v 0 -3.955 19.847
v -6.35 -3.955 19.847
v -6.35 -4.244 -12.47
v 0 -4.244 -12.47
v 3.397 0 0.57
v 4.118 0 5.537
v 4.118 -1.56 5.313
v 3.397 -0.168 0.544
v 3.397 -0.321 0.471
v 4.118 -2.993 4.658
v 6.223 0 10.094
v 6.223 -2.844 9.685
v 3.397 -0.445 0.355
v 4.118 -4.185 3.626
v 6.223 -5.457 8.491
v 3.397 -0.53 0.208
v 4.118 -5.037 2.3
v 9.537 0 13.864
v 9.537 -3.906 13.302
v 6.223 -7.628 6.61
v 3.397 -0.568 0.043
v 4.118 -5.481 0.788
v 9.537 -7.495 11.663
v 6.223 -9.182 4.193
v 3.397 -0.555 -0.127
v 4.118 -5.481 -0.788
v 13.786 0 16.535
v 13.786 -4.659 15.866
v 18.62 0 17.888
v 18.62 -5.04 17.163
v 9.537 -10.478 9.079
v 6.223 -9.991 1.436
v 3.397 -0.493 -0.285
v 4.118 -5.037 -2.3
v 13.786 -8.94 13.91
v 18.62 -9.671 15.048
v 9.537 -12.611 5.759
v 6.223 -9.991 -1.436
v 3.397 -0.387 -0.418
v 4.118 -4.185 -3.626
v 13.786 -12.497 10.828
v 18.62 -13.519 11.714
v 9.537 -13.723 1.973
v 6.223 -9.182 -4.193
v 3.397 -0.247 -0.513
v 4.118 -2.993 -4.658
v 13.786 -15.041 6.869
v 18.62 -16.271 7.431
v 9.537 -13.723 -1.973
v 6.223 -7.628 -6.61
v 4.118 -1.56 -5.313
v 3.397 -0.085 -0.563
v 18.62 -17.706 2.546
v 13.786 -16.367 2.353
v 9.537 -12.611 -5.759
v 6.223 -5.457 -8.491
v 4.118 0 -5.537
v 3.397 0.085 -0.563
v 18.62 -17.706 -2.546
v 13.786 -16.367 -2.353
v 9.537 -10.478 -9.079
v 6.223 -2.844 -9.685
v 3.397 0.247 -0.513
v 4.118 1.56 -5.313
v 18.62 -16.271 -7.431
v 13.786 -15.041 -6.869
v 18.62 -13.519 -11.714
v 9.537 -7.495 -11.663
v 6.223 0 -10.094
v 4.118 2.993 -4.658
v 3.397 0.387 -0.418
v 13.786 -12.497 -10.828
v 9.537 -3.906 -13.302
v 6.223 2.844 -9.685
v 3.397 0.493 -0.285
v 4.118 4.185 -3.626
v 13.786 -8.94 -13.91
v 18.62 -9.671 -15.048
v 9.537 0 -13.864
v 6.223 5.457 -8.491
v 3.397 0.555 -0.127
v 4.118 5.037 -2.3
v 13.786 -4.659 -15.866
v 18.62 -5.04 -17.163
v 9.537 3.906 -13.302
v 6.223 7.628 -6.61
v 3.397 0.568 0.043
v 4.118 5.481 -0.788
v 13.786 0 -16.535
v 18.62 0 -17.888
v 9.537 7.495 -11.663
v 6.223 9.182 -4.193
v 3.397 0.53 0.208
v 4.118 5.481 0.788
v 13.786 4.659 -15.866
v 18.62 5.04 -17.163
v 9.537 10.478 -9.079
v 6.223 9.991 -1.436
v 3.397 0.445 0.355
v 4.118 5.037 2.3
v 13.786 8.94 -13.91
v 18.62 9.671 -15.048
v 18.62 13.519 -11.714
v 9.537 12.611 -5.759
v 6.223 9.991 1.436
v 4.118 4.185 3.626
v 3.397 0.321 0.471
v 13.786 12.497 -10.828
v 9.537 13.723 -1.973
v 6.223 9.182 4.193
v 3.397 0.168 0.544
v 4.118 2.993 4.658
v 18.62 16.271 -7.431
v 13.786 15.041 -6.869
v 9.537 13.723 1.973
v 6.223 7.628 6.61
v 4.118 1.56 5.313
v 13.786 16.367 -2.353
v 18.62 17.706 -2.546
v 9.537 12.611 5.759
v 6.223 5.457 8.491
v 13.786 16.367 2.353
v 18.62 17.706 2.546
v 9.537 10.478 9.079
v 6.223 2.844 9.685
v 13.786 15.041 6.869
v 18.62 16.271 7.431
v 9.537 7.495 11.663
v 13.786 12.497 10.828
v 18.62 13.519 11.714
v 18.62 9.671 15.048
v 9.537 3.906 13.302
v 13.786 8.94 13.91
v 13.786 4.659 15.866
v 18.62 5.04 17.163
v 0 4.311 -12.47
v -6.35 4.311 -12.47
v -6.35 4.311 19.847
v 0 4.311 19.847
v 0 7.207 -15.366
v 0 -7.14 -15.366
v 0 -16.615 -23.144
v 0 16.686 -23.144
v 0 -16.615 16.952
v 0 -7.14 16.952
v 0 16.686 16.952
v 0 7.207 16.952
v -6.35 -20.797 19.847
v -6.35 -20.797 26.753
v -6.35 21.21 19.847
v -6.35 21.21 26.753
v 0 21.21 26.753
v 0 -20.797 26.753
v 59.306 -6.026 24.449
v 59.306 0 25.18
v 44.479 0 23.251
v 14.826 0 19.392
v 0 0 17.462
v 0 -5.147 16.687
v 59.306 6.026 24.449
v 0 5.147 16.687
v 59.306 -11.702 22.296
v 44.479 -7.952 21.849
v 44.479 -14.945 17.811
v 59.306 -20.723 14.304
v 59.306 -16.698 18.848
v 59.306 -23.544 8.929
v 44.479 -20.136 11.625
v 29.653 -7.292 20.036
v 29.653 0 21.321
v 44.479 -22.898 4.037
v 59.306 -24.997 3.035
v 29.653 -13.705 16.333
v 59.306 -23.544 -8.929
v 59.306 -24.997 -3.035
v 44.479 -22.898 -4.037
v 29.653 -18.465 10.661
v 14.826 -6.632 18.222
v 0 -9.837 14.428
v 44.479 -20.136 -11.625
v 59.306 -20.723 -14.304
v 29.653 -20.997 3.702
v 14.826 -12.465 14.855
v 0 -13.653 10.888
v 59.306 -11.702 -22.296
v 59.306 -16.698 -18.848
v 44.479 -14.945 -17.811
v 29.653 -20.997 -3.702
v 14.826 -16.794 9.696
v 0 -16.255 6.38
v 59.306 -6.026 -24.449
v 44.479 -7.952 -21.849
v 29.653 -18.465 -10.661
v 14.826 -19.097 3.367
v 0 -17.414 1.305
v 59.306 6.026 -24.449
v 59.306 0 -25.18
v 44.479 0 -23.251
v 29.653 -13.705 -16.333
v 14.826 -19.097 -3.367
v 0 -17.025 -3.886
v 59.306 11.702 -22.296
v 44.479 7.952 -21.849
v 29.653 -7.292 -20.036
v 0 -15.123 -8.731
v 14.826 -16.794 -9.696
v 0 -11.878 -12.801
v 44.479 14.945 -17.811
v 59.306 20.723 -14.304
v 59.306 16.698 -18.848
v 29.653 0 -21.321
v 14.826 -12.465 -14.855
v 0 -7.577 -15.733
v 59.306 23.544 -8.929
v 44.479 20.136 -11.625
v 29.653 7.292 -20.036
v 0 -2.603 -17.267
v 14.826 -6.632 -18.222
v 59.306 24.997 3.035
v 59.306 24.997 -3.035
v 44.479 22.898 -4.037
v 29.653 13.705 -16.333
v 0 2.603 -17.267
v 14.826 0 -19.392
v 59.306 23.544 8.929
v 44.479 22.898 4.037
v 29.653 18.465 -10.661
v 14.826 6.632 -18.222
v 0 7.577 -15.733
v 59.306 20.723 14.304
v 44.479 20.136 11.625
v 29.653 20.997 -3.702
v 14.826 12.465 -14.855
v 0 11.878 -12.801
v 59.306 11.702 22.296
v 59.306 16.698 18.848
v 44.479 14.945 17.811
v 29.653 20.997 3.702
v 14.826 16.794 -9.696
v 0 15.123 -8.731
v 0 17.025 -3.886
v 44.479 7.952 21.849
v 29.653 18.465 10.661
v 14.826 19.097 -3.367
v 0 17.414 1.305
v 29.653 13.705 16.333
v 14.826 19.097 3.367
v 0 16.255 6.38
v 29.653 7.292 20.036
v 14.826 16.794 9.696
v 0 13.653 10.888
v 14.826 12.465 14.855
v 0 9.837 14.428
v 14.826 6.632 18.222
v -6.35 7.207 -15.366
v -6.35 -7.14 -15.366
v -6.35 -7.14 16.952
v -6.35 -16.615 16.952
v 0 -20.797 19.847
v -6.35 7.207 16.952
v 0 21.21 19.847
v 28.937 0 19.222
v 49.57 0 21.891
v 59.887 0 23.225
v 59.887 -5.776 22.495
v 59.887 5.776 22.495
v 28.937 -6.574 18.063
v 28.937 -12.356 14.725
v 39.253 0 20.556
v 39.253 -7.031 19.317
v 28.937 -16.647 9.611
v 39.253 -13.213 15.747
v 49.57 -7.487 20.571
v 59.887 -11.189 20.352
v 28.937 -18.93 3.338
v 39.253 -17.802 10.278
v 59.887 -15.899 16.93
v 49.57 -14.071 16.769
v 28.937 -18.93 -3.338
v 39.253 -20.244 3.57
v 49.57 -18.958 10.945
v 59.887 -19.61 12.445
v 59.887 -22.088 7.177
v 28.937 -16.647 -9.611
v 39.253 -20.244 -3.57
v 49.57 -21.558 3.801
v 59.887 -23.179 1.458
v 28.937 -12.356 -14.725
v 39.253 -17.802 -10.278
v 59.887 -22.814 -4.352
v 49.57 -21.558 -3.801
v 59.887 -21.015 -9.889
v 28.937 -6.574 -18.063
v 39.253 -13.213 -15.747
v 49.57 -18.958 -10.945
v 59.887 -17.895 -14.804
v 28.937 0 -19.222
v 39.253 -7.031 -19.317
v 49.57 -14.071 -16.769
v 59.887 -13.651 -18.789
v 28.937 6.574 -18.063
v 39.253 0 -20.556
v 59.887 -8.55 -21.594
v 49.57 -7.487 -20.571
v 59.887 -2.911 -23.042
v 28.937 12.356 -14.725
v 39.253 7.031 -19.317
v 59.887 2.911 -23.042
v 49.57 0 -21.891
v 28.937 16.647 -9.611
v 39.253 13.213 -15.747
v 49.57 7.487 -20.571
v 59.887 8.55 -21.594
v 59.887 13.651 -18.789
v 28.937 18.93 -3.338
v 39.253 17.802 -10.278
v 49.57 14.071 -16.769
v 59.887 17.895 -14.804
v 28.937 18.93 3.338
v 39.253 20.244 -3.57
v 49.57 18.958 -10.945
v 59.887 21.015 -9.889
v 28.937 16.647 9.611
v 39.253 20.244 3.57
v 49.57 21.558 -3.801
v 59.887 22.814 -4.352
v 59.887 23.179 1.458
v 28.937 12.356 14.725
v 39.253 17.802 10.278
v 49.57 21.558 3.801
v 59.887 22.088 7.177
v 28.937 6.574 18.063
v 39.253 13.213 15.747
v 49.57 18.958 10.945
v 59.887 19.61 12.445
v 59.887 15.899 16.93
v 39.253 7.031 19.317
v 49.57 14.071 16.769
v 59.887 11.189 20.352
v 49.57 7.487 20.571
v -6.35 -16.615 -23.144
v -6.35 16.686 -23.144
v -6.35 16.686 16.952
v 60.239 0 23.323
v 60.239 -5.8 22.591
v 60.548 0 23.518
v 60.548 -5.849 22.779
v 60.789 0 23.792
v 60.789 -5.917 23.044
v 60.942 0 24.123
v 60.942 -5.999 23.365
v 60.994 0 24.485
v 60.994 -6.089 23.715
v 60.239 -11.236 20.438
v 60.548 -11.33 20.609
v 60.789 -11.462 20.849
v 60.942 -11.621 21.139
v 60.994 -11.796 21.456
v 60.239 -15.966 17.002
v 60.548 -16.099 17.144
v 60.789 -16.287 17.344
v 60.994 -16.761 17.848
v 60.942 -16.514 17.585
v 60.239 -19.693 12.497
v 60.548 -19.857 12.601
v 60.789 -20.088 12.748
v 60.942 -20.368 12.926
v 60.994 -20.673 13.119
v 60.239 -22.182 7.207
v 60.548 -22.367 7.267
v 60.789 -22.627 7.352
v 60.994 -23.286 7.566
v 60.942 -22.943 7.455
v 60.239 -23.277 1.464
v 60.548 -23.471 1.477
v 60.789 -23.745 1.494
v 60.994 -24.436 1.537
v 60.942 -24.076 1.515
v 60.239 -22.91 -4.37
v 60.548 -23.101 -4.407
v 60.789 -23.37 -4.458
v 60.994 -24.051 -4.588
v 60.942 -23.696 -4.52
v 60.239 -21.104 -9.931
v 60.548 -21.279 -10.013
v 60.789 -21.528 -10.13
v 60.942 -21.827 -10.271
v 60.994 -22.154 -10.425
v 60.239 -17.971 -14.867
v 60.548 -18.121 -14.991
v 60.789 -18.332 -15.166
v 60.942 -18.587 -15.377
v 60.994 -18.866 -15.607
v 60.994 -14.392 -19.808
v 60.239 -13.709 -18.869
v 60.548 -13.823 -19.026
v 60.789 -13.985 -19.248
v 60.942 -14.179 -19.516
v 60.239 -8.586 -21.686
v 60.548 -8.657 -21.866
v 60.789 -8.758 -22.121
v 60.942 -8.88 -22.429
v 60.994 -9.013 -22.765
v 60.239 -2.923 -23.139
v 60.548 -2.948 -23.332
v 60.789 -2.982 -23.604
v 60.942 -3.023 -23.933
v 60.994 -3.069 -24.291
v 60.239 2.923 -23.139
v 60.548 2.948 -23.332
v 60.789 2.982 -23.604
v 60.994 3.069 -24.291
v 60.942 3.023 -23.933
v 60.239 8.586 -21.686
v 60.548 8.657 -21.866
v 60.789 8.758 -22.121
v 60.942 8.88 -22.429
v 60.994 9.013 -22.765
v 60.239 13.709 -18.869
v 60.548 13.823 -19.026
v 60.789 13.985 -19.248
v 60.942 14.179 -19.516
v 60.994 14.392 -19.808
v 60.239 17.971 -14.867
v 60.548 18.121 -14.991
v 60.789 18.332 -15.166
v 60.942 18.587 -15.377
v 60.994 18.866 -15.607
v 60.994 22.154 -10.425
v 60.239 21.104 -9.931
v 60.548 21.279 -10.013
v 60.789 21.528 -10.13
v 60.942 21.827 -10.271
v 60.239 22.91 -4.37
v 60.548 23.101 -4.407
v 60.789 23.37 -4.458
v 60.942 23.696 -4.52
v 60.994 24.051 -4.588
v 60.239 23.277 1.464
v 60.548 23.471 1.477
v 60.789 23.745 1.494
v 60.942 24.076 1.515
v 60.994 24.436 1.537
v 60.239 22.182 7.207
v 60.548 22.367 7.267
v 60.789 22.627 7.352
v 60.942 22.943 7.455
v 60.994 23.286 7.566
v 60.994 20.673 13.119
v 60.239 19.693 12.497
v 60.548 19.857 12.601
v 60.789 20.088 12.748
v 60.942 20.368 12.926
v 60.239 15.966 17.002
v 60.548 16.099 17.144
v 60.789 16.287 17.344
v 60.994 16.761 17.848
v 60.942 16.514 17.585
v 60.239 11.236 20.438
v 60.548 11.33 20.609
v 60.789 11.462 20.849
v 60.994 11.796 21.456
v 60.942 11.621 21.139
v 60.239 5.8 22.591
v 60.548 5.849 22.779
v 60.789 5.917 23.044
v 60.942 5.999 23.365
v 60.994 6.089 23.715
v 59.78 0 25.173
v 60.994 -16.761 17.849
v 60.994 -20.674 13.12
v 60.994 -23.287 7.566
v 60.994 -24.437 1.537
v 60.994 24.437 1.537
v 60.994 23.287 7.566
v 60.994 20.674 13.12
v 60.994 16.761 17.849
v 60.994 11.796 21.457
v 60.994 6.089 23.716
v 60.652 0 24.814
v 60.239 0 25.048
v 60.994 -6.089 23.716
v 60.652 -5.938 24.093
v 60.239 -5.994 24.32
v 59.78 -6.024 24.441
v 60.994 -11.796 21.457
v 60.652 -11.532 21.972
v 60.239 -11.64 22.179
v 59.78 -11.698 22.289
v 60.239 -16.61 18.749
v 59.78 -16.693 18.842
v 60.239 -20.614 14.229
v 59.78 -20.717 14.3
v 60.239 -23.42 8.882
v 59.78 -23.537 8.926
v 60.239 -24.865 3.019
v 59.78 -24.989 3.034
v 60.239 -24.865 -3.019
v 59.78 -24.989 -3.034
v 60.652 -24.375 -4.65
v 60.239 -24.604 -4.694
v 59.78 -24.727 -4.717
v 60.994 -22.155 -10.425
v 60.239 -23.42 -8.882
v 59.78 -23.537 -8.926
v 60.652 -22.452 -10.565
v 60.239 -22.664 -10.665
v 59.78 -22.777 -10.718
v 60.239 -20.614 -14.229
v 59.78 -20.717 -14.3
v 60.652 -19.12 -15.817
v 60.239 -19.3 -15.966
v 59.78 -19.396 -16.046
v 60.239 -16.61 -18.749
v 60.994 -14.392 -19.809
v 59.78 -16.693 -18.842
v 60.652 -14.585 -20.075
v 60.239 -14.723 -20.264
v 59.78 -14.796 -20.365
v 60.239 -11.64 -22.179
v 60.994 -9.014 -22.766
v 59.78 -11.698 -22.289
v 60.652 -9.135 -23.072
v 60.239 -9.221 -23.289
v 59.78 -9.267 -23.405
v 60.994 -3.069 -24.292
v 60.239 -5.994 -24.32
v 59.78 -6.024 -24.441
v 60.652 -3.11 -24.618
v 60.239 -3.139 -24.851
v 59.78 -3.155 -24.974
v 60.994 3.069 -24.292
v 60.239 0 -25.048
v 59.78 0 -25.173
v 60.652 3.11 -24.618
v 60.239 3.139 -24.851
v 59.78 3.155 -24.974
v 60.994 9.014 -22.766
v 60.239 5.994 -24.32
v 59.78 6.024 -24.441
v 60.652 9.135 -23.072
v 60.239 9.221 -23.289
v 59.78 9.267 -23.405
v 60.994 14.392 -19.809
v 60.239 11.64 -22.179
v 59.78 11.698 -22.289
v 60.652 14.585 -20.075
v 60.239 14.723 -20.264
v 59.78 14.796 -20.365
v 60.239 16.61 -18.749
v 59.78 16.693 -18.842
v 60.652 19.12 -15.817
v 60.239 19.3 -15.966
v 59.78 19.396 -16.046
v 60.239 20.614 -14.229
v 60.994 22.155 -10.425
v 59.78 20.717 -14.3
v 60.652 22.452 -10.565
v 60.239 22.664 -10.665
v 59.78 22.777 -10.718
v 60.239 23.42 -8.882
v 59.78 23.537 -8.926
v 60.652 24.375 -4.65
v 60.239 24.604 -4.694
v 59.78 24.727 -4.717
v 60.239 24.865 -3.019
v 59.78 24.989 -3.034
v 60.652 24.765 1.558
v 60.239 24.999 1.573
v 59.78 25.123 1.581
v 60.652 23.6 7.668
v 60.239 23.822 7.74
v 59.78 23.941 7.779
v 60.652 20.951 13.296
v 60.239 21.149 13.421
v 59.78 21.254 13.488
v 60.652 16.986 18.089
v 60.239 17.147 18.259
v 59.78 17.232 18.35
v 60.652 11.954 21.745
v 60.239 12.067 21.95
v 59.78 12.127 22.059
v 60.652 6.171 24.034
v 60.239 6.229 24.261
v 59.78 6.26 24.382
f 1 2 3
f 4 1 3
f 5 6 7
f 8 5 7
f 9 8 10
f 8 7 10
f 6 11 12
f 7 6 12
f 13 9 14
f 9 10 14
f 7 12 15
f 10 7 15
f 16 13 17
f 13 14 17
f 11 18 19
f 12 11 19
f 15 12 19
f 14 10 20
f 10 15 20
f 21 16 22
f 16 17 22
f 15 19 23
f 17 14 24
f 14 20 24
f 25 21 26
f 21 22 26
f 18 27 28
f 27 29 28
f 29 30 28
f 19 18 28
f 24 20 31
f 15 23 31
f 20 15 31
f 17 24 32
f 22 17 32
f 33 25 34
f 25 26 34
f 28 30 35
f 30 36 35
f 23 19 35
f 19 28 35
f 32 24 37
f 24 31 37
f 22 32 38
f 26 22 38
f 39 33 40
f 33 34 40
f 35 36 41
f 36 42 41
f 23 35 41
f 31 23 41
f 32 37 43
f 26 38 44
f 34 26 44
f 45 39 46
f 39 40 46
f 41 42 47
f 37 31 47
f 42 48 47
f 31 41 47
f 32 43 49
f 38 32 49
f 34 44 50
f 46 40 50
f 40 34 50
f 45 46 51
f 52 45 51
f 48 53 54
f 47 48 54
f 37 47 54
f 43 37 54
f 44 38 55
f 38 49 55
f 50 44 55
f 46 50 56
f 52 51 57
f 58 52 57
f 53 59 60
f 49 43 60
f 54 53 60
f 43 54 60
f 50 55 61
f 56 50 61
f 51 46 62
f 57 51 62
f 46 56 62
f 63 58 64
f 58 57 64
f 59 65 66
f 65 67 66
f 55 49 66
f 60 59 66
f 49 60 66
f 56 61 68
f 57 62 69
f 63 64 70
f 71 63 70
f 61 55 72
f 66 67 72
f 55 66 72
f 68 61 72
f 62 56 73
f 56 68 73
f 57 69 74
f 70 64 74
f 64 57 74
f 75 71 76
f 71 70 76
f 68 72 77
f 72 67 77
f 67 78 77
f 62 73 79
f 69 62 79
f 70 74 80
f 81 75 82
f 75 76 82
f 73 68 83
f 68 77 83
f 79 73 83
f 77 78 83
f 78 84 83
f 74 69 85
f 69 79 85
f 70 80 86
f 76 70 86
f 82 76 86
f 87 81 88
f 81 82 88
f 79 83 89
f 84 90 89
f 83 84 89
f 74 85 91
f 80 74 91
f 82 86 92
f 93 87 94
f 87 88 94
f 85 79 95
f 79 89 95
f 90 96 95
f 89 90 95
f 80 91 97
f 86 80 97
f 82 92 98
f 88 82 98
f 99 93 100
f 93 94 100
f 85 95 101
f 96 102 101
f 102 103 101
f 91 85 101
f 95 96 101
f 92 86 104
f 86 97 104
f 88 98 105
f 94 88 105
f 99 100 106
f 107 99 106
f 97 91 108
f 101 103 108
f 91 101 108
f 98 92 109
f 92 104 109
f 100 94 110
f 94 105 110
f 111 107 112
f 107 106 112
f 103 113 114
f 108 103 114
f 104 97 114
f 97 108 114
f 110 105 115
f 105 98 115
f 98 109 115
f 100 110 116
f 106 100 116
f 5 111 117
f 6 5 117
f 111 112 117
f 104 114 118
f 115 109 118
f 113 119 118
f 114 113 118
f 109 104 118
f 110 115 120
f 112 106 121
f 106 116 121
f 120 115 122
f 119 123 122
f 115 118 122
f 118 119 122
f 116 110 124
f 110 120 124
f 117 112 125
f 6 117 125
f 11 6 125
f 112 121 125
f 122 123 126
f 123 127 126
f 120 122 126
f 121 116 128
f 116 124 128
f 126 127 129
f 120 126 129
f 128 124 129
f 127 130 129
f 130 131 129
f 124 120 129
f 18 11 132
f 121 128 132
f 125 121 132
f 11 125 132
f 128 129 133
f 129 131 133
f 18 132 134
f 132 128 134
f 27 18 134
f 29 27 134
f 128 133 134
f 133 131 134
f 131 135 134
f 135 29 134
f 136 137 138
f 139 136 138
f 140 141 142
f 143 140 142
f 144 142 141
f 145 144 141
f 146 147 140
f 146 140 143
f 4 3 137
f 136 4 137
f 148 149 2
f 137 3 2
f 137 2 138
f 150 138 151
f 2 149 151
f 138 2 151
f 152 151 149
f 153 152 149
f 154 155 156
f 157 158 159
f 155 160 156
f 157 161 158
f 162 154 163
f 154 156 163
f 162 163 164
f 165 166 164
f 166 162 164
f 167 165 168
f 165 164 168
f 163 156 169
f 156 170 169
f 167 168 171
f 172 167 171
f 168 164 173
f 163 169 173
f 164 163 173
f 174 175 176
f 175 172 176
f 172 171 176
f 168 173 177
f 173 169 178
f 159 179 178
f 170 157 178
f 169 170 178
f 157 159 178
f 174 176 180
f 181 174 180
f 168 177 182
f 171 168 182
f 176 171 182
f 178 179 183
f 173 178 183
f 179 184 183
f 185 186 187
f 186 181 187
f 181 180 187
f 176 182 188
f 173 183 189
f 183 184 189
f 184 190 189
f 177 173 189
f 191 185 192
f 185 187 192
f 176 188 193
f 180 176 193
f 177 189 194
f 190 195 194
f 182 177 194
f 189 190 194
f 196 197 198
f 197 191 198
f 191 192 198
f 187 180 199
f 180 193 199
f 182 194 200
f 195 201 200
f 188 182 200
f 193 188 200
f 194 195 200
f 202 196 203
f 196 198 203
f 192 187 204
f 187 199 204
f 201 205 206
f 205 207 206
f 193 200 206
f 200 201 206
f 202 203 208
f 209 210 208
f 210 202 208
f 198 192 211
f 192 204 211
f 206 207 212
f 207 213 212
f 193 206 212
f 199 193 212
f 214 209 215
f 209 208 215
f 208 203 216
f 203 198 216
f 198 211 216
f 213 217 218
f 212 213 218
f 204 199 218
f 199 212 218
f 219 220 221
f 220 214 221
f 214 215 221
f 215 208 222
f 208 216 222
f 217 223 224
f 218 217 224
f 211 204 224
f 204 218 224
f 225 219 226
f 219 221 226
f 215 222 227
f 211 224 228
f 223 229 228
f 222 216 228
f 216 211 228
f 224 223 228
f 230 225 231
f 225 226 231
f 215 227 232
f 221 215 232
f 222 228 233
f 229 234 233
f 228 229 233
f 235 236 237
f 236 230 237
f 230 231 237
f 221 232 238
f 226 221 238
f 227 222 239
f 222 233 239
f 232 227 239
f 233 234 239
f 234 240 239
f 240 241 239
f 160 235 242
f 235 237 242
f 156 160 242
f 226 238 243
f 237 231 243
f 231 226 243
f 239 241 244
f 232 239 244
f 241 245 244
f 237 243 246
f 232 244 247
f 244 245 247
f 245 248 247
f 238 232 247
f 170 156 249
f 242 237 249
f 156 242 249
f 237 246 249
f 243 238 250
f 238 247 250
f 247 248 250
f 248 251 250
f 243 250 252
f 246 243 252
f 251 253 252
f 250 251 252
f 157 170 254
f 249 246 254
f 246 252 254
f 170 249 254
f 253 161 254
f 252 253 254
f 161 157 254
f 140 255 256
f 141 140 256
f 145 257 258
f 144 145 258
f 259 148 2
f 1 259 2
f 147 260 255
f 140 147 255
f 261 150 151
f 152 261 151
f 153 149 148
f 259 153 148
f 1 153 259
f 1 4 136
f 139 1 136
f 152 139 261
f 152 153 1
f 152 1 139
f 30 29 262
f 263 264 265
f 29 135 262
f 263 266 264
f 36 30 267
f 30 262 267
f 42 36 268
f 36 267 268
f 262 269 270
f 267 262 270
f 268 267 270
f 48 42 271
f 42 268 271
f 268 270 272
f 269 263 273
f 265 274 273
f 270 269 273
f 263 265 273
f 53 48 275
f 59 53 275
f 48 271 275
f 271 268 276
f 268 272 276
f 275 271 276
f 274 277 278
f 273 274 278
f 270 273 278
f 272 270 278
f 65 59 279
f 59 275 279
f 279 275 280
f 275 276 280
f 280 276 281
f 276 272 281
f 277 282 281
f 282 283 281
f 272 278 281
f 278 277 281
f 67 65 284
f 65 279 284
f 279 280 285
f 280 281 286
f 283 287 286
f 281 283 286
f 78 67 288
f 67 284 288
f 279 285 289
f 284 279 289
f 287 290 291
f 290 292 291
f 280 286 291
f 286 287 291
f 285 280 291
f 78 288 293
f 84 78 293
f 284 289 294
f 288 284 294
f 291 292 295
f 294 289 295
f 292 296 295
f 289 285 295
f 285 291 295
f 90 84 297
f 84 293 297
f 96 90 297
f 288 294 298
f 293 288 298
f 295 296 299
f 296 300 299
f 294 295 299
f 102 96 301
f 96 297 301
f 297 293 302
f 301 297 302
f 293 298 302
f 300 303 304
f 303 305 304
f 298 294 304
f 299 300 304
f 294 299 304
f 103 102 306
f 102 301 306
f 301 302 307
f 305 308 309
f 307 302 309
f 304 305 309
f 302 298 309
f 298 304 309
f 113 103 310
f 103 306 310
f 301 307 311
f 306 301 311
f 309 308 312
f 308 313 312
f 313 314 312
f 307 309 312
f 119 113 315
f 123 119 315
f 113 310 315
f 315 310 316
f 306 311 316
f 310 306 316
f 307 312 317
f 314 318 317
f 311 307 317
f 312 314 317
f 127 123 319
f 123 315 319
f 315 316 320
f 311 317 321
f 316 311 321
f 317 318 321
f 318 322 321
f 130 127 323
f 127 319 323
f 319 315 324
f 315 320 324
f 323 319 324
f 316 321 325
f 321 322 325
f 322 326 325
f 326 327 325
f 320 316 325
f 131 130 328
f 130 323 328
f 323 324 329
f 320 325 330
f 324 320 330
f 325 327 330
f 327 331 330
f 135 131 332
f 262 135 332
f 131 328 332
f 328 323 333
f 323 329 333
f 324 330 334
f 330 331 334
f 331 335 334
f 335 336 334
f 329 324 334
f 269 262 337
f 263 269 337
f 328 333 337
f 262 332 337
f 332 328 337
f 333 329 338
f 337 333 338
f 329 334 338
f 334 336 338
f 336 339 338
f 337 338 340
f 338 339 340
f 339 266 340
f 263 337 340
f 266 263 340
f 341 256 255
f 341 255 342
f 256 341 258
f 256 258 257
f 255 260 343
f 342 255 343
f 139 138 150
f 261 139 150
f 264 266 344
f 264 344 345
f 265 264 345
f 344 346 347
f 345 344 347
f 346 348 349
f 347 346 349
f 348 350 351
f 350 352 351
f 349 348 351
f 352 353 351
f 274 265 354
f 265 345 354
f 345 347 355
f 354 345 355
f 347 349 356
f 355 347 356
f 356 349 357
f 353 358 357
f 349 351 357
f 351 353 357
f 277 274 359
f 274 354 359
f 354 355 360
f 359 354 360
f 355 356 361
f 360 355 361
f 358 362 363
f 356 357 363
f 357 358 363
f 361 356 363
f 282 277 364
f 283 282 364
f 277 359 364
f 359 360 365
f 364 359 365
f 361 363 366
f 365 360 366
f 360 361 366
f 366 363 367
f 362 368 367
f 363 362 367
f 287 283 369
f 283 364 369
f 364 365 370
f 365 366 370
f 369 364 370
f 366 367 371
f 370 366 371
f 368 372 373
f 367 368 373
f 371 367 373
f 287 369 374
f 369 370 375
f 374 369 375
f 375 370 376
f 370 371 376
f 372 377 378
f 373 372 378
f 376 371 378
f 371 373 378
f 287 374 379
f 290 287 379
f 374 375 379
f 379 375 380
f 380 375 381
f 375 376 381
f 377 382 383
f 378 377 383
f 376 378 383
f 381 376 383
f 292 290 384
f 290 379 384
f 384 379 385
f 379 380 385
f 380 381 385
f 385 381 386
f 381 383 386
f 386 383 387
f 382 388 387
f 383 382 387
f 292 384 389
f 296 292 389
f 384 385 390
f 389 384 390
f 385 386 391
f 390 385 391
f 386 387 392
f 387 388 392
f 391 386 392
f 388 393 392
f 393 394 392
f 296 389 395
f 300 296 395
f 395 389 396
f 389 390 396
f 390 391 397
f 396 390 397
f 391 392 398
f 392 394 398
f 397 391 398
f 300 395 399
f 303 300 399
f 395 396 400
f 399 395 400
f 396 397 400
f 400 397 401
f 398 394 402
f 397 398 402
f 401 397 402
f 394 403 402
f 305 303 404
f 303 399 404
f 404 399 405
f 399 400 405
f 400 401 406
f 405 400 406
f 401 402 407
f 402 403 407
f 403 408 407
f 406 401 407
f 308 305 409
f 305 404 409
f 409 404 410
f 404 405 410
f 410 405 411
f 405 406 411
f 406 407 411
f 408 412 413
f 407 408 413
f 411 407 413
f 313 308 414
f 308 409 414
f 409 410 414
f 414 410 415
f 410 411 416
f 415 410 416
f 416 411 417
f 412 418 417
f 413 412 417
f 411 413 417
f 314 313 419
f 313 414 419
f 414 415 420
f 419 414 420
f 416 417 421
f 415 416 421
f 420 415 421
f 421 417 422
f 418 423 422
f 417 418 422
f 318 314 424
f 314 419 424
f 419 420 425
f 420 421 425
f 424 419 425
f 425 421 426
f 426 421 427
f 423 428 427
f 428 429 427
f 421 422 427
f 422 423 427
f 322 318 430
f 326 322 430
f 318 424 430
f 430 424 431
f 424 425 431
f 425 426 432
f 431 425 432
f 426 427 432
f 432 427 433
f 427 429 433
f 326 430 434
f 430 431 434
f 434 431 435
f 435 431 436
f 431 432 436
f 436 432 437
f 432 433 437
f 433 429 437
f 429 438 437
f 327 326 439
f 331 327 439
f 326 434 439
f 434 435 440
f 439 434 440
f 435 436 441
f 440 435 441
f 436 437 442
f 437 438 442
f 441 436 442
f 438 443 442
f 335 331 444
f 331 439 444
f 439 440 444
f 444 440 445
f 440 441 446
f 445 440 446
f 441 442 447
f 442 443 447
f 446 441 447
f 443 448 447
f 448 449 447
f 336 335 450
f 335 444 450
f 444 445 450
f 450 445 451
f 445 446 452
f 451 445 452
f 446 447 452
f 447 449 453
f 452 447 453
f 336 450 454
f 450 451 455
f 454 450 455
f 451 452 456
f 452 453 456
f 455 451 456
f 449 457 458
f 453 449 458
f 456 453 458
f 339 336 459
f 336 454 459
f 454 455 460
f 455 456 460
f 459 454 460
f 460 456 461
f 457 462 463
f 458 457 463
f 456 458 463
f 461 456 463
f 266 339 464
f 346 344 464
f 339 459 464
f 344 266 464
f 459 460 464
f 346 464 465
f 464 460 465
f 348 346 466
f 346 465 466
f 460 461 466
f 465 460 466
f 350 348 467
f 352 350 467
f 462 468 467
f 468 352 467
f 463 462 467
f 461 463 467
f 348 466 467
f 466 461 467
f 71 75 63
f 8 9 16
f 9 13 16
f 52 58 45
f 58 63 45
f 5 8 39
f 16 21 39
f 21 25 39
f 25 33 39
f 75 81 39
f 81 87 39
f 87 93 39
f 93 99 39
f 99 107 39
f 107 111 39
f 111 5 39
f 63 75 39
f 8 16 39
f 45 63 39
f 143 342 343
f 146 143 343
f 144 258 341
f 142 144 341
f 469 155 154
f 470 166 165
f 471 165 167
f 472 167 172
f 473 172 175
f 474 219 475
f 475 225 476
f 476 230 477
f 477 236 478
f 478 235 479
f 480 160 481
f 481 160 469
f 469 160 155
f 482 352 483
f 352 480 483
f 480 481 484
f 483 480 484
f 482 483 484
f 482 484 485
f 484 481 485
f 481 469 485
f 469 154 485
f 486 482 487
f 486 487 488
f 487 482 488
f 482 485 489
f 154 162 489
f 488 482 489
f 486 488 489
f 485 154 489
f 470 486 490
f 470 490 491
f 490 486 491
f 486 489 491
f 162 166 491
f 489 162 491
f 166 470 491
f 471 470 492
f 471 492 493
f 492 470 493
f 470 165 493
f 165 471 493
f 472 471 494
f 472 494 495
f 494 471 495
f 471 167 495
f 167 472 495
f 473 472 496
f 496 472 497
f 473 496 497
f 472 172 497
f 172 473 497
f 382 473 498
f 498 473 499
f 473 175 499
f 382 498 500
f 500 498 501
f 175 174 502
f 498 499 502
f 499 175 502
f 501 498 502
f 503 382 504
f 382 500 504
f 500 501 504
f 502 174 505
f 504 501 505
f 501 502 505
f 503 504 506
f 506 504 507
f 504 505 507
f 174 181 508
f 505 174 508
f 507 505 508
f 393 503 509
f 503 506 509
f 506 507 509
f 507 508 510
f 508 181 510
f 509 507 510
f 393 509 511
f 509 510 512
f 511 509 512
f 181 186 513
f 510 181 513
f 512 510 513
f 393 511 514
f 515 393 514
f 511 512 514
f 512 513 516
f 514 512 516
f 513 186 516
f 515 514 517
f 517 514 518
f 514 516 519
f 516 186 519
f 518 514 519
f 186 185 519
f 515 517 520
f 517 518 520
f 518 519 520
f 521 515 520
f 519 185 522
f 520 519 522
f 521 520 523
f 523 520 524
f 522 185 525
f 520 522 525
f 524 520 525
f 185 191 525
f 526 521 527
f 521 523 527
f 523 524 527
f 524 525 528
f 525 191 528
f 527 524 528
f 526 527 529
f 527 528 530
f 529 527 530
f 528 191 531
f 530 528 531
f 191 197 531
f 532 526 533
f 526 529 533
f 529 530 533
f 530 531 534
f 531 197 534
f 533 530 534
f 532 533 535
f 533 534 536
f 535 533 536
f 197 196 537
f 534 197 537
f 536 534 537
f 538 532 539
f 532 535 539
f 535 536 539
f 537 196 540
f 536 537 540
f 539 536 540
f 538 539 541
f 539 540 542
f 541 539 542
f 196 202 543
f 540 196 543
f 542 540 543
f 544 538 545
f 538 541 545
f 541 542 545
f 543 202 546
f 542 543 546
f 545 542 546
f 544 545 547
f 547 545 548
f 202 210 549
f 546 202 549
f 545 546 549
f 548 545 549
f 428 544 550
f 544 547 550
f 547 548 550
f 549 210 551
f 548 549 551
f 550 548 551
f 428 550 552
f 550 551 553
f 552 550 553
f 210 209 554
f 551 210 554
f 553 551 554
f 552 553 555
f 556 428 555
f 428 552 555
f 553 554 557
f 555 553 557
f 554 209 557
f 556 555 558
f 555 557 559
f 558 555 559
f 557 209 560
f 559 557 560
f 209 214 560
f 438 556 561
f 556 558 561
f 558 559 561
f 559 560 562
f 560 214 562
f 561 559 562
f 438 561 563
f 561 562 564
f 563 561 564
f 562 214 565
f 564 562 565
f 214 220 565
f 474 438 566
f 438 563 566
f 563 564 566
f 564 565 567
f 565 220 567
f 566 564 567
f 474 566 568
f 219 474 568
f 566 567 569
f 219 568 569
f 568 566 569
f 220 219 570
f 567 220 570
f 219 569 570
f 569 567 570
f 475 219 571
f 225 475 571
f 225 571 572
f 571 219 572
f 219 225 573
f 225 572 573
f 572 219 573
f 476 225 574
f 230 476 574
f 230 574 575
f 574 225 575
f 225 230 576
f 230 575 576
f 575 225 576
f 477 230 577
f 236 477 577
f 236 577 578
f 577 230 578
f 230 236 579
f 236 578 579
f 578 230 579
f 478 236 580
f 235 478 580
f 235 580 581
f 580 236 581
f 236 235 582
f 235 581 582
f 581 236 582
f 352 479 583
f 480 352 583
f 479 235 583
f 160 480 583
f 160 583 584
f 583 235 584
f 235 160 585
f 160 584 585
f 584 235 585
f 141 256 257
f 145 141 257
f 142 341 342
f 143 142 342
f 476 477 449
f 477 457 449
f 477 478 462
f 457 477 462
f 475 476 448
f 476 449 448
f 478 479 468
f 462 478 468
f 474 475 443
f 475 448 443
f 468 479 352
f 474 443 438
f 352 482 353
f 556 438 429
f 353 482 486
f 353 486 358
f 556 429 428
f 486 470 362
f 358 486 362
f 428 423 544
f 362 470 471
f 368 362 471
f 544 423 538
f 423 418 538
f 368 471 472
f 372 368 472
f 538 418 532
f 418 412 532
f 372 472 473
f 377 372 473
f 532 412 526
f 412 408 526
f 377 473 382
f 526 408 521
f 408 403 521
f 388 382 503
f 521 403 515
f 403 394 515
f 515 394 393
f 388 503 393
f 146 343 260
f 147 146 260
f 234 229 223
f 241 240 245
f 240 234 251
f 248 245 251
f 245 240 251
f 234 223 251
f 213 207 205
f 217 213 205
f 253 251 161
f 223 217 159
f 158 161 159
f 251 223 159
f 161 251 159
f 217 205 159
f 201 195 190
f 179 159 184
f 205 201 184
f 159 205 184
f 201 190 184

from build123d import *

# Parameters (mm, degrees)
F2_R     = 17.4625
F3_R     = 1.27
F7_DEPTH = 6.35


# Not quite as in the source:
# - a fillet or chamfer that OpenCascade refuses, or shapes differently, is made with other operations: its cross-section is extruded or revolved along the edge and cut away or added


with BuildPart() as f1:
    # F0 (on Front) → F1 (revolve)
    with BuildSketch(Plane.XZ):
        Polygon((0, 17.4625), (0, 15.4798403605), (3.3970845398, 15.9191861749), (60.9941408038, 23.3682282269), (60.9941408038, 25.4), align=None)
        Polygon((3.3970845398, 15.9191861749), (0, 15.4798403605), (0, 0), (3.3970845398, 0), align=None)
    revolve(axis=Axis((30.1625, 0, 0), (1, 0, 0)))

    # F2
    f2_edges = [f1.edges().sort_by_distance(p)[0] for p in [
        (3.397085, 0, -15.919186),
    ]]
    fillet(f2_edges, radius=F2_R)

    # F3
    f3_edges = [f1.edges().sort_by_distance(p)[0] for p in [
        (60.994141, 0, -23.368228),
    ]]
    fillet(f3_edges, radius=F3_R)

    # F4: fillet of radius 1.905 on 1 edges, made by hand

    # F4_s1 → F4_t2 (revolve, cut)
    with BuildSketch(Plane.XZ):
        with BuildLine():
            ThreePointArc((60.9944516934, 24.4848076553), (60.2207035097, 25.0552991923), (59.2669390878, 25.1756331992))
            Line((59.2669390878, 25.1756331992), (59.2423403965, 25.3646569527))
            ThreePointArc((59.2423403965, 25.3646569527), (60.1059670639, 25.4766420254), (60.9695421125, 25.5890237535))
            Line((60.9695421125, 25.5890237535), (61.1847584185, 25.4))
            ThreePointArc((61.1847584185, 25.4), (61.1847584185, 24.9424038276), (61.1426042626, 24.6047488544))
            Line((61.1426042626, 24.6047488544), (60.9944516934, 24.4848076553))
        make_face()
    revolve(axis=Axis((60.9941408038, 0, 0), (1, 0, 0)), mode=Mode.SUBTRACT)


with BuildPart() as f7:
    # F6 (on offset) → F7 (new body)
    with BuildSketch(Plane.YZ.offset(-6.35)):
        Polygon((-16.6146121919, -23.1440894544), (16.686482355, -23.1440894544), (16.686482355, 16.9517148048), (7.2066797875, 16.9517148048), (7.2066797875, -15.3657568857), (-7.1404121919, -15.3657568857), (-7.1404121919, 16.9517148048), (-16.6146121919, 16.9517148048), align=None)
    extrude(amount=F7_DEPTH)


with BuildPart() as f7b:
    # F6 (on offset) → F7, piece 2 (new body)
    with BuildSketch(Plane.YZ.offset(-6.35)):
        Polygon((21.2100986391, 26.752922684), (-20.796822384, 26.752922684), (-20.796822384, 19.8473148048), (-3.9551745407, 19.8473148048), (-4.2437847807, -12.4701568857), (4.3110797875, -12.4701568857), (4.3110797875, 19.8473148048), (21.2100986391, 19.8473148048), align=None)
    extrude(amount=F7_DEPTH)


solid = Compound([f1.part, f7.part, f7b.part])
